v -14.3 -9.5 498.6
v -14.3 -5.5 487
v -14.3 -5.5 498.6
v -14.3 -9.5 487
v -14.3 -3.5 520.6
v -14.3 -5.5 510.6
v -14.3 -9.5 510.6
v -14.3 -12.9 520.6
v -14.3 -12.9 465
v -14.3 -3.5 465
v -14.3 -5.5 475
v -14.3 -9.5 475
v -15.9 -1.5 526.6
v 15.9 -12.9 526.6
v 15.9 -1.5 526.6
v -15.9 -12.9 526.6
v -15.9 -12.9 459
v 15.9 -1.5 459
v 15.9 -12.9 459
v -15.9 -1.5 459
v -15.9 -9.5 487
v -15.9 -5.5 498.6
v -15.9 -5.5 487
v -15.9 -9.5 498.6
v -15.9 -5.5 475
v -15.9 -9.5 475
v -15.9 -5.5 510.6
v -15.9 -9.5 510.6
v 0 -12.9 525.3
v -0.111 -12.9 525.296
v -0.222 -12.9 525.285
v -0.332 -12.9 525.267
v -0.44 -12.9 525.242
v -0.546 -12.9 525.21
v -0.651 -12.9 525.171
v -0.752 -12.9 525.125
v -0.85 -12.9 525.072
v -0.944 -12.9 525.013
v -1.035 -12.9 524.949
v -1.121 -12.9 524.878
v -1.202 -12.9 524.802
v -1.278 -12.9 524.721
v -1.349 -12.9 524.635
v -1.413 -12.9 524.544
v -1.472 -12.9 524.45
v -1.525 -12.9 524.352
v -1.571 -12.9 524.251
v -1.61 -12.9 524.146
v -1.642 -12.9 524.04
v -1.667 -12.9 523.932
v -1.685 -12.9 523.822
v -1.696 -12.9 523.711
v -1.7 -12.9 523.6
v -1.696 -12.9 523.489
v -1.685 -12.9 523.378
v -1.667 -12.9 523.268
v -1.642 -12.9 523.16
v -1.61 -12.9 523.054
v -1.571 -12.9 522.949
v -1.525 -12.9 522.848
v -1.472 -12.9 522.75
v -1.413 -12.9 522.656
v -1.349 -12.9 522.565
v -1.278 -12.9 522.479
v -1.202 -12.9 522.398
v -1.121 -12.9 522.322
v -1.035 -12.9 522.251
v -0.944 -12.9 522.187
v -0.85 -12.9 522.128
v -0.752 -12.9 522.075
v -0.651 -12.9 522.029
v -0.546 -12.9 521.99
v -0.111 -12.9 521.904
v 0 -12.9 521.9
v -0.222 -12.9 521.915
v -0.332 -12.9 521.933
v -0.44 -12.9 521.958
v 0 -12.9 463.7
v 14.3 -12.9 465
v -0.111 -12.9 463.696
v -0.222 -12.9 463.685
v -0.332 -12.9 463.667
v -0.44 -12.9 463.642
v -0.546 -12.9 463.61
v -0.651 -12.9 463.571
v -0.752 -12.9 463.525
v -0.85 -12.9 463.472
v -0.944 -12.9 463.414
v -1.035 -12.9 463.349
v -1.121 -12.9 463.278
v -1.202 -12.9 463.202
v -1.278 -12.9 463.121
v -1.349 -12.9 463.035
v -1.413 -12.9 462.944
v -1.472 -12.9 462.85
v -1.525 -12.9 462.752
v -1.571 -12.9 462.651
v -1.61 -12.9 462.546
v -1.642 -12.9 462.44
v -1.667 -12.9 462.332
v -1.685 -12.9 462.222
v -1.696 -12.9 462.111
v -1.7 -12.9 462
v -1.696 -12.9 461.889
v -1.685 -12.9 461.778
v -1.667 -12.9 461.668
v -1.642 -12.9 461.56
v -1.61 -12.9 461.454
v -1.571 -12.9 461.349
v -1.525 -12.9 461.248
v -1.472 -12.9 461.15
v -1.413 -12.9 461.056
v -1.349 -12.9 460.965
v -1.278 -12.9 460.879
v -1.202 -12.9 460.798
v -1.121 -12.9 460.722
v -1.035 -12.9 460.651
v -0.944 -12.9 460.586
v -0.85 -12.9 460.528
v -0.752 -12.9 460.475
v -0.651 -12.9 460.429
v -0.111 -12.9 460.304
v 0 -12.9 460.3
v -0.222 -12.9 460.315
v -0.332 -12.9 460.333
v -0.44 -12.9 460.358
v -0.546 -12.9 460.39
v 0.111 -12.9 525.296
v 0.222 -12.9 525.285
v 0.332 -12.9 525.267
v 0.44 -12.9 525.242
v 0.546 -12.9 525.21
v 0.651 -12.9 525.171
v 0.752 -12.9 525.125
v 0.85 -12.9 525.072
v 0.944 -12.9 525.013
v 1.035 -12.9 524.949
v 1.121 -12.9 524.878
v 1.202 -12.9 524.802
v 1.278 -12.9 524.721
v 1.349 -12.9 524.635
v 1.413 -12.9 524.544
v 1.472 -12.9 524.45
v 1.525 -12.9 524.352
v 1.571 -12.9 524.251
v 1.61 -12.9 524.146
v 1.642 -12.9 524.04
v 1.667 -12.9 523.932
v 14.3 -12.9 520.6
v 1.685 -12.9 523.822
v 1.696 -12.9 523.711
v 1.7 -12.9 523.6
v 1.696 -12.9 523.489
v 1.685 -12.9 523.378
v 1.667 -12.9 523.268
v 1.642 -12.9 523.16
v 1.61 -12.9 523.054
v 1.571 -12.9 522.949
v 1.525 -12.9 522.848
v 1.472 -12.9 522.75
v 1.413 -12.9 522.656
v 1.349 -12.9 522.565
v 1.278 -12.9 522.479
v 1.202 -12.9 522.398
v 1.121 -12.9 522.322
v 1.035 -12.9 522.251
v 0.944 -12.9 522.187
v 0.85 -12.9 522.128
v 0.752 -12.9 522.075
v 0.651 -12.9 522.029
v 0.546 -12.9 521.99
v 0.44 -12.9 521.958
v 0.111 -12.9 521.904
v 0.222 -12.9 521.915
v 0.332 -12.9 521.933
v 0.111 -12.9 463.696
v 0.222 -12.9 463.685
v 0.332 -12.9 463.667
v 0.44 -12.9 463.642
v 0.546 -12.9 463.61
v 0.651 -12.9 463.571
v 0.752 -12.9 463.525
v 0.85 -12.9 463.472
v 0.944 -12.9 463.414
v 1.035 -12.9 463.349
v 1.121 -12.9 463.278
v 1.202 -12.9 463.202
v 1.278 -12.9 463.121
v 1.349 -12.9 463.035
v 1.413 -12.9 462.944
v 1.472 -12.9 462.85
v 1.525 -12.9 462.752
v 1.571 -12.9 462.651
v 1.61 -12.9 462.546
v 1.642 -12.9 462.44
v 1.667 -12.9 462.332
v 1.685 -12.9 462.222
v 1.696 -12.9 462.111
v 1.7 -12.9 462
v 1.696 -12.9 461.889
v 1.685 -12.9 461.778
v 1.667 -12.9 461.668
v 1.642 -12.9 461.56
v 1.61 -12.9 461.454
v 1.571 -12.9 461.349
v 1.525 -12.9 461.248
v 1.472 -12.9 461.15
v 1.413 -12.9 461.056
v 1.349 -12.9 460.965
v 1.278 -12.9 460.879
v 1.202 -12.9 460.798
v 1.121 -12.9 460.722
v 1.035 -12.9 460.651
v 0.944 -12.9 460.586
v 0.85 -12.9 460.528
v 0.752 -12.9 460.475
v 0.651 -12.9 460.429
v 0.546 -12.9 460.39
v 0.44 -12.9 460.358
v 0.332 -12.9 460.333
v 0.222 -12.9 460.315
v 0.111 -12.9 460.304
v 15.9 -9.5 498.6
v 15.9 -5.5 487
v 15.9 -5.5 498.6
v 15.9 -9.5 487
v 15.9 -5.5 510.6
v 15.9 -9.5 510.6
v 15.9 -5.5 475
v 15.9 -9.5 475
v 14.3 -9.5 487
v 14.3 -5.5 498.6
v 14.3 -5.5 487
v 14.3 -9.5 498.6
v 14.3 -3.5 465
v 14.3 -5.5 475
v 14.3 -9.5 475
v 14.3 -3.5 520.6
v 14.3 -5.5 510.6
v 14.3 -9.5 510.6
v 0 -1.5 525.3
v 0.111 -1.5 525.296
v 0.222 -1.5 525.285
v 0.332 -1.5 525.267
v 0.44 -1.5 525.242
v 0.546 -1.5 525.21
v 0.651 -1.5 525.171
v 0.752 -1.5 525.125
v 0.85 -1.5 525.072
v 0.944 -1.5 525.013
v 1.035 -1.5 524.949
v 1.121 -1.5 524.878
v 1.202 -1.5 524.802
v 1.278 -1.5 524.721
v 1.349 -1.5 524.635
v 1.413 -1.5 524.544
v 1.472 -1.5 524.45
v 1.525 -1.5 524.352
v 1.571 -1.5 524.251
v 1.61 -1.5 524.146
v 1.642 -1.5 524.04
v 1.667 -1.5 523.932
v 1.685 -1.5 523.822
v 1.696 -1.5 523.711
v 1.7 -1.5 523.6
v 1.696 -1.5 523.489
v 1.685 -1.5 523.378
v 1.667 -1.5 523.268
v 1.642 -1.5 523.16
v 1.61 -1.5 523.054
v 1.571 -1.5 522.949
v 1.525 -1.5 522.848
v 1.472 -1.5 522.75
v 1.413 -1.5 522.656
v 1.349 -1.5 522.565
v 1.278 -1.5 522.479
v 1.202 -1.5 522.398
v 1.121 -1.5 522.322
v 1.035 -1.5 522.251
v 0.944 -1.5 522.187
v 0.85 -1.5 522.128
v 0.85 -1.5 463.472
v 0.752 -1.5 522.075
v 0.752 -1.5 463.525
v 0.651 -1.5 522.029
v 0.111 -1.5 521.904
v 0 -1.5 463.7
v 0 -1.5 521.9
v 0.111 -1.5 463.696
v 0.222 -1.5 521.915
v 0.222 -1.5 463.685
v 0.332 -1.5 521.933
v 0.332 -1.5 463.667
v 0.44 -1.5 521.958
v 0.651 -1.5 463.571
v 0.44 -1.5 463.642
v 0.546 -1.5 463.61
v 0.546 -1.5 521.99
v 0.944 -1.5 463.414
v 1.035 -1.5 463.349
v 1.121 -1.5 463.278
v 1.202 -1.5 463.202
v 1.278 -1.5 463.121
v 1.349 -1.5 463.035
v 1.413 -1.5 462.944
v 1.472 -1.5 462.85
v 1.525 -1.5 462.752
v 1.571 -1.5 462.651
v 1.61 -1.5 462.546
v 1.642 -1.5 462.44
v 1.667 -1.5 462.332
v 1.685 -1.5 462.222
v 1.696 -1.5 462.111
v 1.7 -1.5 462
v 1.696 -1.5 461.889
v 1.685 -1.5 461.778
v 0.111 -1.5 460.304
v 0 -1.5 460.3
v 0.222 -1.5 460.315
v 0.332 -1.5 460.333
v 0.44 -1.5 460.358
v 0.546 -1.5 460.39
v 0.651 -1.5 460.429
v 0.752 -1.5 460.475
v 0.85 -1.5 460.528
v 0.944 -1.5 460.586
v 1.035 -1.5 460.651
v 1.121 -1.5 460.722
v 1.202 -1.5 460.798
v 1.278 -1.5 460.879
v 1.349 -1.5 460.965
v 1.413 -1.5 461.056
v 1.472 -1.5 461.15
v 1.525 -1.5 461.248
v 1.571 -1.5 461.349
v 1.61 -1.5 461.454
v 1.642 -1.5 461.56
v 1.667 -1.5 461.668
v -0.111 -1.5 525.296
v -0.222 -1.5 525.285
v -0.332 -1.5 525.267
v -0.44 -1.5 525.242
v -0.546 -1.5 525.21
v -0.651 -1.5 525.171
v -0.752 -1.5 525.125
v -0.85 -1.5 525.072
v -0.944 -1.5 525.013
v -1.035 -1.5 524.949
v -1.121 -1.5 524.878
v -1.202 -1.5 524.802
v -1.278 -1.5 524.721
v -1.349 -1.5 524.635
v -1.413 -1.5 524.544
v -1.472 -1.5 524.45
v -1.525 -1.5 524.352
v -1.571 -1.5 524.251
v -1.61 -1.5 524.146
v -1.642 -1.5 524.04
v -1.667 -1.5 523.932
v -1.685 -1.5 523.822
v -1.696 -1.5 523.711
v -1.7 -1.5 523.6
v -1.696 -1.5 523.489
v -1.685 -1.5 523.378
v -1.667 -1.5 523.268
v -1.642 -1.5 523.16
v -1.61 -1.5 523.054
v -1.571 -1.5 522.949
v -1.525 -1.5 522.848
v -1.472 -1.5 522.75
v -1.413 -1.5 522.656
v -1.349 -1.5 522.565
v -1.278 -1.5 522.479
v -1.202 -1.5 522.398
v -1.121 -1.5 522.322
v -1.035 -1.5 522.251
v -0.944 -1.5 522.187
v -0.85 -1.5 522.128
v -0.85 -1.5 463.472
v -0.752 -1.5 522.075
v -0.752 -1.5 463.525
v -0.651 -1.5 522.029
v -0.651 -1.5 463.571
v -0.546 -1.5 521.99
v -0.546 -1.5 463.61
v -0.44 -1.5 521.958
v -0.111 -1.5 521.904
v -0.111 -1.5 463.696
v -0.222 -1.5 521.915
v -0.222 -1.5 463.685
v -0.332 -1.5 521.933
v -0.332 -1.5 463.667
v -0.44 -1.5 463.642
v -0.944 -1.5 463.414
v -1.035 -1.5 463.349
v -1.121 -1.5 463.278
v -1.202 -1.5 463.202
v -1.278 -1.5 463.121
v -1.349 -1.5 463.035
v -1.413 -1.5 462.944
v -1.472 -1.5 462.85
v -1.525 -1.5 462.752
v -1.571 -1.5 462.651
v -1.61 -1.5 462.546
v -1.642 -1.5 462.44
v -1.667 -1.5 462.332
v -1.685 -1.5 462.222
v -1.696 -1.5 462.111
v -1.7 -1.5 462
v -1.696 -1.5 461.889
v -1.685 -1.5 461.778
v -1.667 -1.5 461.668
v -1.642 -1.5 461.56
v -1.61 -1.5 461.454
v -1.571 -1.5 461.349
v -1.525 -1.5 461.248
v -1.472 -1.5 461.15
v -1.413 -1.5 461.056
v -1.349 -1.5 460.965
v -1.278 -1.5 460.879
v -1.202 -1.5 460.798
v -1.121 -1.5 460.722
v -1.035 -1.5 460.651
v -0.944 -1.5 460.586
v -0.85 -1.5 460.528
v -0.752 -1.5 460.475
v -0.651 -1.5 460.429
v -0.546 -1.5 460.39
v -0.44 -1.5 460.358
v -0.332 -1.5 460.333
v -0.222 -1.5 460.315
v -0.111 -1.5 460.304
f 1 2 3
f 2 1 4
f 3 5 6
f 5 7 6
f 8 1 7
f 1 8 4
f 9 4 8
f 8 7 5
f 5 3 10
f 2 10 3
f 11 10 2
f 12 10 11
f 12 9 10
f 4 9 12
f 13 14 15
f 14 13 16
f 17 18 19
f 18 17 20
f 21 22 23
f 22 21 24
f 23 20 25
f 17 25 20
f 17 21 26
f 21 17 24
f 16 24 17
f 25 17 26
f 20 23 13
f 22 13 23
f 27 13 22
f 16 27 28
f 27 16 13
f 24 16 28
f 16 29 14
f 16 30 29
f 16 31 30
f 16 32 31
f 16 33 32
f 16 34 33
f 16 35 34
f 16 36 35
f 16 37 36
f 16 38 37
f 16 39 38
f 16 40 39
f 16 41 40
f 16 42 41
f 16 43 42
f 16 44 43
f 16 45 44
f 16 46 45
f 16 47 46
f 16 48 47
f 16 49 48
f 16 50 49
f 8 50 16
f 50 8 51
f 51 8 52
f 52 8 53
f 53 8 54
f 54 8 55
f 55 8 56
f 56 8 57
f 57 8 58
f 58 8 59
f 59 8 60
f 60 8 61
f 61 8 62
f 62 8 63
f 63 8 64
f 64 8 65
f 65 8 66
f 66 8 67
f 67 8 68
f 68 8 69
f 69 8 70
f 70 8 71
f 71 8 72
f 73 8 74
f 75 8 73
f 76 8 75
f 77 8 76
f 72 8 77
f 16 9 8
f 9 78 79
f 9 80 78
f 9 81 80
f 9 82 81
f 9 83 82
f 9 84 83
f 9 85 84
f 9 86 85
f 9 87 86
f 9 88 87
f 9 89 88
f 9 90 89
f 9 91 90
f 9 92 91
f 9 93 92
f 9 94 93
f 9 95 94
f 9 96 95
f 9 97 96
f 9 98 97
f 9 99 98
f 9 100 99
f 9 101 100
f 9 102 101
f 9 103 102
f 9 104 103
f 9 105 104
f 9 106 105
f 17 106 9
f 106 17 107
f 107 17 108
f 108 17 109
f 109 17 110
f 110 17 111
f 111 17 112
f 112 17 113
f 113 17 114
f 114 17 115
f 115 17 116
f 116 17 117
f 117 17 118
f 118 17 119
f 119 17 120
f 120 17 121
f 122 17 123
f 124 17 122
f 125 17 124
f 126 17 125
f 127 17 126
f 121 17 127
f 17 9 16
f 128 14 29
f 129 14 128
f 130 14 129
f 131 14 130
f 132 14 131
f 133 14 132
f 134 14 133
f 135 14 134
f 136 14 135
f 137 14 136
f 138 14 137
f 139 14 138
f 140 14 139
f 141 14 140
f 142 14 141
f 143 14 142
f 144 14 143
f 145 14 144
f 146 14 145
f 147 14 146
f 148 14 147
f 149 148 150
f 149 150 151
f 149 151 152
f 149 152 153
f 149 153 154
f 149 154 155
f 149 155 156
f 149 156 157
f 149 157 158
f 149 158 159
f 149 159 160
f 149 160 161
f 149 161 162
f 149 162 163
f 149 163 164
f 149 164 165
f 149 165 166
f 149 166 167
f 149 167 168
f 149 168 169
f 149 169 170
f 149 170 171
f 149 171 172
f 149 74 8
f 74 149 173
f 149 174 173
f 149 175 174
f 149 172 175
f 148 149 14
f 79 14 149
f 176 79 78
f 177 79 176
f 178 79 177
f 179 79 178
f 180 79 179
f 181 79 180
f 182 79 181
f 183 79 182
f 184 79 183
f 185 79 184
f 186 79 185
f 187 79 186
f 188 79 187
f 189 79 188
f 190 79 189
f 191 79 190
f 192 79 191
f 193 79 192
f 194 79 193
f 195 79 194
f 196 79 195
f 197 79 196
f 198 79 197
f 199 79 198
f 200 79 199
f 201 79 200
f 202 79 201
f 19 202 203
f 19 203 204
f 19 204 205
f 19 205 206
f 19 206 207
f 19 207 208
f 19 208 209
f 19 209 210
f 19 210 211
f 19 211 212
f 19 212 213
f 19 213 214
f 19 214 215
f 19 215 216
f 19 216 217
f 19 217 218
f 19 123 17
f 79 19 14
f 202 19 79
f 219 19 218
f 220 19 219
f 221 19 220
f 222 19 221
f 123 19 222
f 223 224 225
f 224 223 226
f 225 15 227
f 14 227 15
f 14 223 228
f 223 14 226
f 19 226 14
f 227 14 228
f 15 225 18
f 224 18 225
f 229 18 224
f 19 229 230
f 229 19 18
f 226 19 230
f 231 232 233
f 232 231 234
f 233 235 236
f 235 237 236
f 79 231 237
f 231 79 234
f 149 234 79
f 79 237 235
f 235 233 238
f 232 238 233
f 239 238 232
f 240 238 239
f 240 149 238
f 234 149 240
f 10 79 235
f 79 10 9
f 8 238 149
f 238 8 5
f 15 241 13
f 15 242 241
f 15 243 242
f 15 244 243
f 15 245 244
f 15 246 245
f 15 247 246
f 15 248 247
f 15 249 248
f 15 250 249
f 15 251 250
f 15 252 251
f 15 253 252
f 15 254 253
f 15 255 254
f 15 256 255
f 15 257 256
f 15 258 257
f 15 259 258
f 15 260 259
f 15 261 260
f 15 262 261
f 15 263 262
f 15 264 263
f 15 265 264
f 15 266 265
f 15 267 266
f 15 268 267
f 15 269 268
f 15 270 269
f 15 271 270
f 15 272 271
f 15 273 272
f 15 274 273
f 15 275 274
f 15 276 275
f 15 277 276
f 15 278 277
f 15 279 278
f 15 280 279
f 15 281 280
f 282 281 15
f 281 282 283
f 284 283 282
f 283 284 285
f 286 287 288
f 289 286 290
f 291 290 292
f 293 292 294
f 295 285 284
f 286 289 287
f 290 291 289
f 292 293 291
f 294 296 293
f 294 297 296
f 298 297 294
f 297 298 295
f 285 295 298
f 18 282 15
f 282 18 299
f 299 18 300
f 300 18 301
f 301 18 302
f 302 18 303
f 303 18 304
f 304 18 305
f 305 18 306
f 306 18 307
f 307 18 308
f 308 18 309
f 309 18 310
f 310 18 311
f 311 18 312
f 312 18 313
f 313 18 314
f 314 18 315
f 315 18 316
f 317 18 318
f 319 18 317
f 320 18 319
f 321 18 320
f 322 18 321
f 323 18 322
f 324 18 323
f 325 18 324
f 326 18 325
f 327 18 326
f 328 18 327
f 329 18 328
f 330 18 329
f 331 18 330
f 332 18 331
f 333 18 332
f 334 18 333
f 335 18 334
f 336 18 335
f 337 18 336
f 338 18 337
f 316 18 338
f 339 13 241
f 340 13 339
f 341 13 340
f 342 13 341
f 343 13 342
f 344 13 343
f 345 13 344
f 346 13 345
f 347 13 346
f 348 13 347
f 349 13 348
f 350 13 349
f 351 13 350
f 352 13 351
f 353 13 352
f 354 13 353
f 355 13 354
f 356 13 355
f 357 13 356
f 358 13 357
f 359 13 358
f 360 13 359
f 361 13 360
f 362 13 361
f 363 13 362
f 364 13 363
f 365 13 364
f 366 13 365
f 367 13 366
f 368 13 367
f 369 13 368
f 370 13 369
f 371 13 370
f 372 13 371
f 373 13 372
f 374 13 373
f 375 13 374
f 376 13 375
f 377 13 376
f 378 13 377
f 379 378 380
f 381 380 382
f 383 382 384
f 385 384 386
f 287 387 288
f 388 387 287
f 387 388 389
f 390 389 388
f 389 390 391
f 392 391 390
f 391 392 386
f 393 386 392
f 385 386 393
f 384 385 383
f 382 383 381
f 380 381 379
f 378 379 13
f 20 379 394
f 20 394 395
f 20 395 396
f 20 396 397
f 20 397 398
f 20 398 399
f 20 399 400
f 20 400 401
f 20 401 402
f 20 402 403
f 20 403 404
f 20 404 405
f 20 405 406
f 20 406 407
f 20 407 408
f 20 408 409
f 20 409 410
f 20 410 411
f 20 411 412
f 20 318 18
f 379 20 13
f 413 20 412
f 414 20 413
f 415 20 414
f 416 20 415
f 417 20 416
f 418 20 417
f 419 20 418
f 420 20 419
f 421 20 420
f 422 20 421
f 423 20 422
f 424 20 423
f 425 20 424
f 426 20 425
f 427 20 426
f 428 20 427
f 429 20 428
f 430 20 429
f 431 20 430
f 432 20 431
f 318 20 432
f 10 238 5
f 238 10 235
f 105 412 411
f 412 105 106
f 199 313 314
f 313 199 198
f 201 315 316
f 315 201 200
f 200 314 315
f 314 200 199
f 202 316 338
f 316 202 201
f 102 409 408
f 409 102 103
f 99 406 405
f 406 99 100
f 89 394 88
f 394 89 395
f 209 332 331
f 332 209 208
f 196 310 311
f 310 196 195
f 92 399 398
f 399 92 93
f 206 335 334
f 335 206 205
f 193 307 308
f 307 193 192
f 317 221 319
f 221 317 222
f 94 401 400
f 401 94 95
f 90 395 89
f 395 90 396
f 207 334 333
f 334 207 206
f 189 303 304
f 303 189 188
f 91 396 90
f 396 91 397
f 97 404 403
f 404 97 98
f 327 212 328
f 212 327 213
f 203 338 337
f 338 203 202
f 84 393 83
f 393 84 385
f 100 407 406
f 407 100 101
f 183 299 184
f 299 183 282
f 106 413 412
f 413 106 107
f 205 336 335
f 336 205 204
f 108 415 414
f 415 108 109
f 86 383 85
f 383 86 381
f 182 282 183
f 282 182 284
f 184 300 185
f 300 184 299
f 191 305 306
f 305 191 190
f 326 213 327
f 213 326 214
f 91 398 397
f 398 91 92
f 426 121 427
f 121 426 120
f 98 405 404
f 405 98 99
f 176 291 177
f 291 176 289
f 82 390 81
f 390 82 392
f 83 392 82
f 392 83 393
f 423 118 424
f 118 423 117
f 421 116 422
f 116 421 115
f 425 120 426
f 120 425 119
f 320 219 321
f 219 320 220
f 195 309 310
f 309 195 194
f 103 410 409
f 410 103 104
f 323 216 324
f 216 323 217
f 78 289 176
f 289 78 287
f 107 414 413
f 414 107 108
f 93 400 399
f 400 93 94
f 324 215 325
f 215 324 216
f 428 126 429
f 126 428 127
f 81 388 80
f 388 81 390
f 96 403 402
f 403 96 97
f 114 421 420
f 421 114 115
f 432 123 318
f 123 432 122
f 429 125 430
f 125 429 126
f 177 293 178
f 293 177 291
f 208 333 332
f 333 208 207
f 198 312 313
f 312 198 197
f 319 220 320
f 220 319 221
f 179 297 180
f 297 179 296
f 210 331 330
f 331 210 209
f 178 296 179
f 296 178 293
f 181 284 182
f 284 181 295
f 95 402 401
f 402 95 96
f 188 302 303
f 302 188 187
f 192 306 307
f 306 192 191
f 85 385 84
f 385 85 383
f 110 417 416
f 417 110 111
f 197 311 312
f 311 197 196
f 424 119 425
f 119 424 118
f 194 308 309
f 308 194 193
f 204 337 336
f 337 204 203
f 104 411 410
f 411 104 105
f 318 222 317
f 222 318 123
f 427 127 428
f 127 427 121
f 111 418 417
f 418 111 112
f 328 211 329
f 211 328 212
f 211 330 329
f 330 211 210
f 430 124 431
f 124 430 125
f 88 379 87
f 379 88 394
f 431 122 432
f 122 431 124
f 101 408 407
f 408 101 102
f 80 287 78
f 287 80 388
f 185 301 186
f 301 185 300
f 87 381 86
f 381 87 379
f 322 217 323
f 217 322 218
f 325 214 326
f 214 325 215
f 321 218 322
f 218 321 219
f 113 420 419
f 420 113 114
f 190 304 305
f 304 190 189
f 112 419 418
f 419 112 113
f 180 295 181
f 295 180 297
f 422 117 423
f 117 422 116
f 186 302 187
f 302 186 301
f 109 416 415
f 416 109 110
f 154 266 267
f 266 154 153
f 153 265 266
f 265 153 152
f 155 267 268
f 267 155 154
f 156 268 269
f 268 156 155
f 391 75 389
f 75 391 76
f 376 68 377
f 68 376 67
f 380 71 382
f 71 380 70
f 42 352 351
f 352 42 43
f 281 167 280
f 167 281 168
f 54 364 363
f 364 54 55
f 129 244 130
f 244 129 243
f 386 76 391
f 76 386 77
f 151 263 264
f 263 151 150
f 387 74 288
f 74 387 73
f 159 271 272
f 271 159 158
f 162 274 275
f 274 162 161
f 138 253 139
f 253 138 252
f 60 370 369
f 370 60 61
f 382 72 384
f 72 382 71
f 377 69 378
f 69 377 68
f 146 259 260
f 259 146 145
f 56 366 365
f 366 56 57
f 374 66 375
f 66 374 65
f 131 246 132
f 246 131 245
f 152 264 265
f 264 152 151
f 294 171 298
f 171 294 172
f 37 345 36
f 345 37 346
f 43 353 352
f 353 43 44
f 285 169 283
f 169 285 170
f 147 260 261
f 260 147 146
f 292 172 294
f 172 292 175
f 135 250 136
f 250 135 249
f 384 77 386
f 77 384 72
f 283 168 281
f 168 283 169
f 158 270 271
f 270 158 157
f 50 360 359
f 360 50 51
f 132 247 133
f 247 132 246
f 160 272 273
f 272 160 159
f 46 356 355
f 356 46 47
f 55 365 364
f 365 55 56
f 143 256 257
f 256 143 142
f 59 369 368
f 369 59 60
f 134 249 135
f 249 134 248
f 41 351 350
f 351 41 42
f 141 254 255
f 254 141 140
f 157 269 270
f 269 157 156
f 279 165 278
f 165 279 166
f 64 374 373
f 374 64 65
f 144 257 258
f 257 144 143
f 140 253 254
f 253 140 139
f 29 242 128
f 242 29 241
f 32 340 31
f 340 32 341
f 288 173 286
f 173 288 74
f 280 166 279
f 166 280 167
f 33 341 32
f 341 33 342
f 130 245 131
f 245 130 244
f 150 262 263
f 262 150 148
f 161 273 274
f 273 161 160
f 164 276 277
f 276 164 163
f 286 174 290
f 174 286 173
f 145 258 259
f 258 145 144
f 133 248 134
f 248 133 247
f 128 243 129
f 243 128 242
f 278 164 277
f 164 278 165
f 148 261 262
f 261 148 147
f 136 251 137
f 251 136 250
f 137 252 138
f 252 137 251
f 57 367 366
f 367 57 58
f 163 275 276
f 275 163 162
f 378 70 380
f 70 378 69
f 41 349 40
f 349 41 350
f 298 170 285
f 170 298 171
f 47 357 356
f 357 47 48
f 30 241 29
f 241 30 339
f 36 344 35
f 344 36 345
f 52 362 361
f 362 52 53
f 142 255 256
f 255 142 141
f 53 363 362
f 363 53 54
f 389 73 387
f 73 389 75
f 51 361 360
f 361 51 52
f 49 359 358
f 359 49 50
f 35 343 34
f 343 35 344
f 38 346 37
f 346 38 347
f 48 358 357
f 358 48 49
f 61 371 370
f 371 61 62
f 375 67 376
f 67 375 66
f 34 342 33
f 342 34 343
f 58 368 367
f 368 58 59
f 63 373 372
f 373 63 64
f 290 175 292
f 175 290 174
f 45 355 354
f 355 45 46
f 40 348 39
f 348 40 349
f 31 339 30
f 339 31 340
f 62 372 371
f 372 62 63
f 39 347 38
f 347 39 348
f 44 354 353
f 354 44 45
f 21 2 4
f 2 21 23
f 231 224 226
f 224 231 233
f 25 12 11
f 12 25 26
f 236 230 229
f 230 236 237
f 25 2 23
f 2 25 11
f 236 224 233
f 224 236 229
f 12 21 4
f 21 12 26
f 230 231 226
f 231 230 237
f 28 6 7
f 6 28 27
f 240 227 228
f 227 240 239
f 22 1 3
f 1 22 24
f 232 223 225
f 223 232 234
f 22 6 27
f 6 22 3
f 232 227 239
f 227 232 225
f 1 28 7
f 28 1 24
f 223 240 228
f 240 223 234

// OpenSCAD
// file: ../lib/astra66_core.scad
// =============================================================================
// ASTRA-66 CAD rev B -- core library
// Parameters (generated from analysis.py by build.py), derived stations and helpers.
// Every part file includes this; stations mirror analysis.py X[] exactly.
//
// Frame: rocket axis = +Z, STA 0 = nose tip, stations increase aft.
// Angles: measured about +Z from +X toward +Y.  90 deg = switch / hatch side,
// 270 deg = camera side, 45 deg = rail-button line, fins at 0/90/180/270 deg.
// =============================================================================
include <../astra66_params.scad>

$fn = FN;
EPS = 0.01;
CAD_REV = "B";

// ----------------------------------------------------------------- radii
R_OD    = BODY_OD / 2;                 // body tube outer
R_ID    = BODY_ID / 2;                 // body tube inner
R_SH    = (BODY_ID - FIT_SH) / 2;      // printed shoulder / ring OD radius
R_SI    = R_SH - NC_SH_WALL;           // nose shoulder inner radius
R_CO    = CPL_OD / 2;                  // coupler outer
R_CI    = CPL_ID / 2;                  // coupler inner
R_BH_IN = (CPL_ID - 0.2) / 2;          // inner bulkhead disc (fits in coupler)
R_MO    = MMT_OD / 2;
R_MI    = MMT_ID / 2;
R_RING_BORE = (MMT_OD + FIT_SH) / 2;   // centering-ring / core bore
R_TAB_FLOOR = max(R_MO, RET_CLEAR_D / 2);          // rev B: tab clears the COTS retainer
FIN_TAB_H   = R_OD - R_TAB_FLOOR - FIN_TAB_CLR;

// ----------------------------------------------------------------- stations
X_NC_BASE     = NC_L;
X_SH_END      = NC_L + NC_SH_L;
X_PL_END      = NC_L + PL_L;
X_BAND_END    = X_PL_END + AV_BAND_L;
X_END         = X_BAND_END + BO_L;
L_OVERALL     = X_END;                              // airframe length (excl. COTS retainer)
X_CPL_FWD     = X_PL_END - AV_INS;
X_CPL_AFT     = X_BAND_END + AV_INS;
X_AVB_FWD_OUT = X_CPL_FWD - AV_BH_T;                // AV-303 forward face
X_AVB_AFT_OUT = X_CPL_AFT + GASKET_T;               // AV-304 outer-disc forward face
X_AVB_AFT_END = X_AVB_AFT_OUT + AV_BH_T;            // AV-304 aft face (recovery bay starts)
X_SLED_FWD    = X_CPL_FWD + AV_BH_T + SLED_FWD_GAP;
X_SLED_AFT    = X_SLED_FWD + SLED_L;
X_MMT_AFT     = X_END + MMT_AFT_EXT;
X_MMT_FWD     = X_MMT_AFT - MMT_L;
X_FIN_LE      = X_END - FIN_CR;
X_TAB_FWD     = X_FIN_LE + FIN_TAB_FWD;
X_TAB_AFT     = X_END - LOCK_T;
X_CORE_FWD    = X_TAB_FWD - CORE_RING_T;
X_CORE_AFT    = X_END - LOCK_T;
X_NC_SCREW    = NC_L + NC_SH_L / 2;
X_CAM         = X_SH_END + CAM_OFF;
X_HATCH       = X_SH_END + HATCH_OFF;
X_RB_FWD      = X_MMT_FWD - RB_FWD_OFF;
X_RB_AFT      = X_END - RB_AFT_OFF;
X_TRAY_FWD    = X_AVB_FWD_OUT - TRAY_L;
X_SW          = X_PL_END + AV_BAND_L / 2;
X_MOTOR_FWD   = X_MMT_AFT - MOTOR_L;
X_BAT0        = X_SLED_FWD + 2;
BAT_CAGE_L    = 12 + BAT_L + 0.6;
PAYLOAD_BAY_L  = X_AVB_FWD_OUT - X_SH_END;
RECOVERY_BAY_L = X_MMT_FWD - X_AVB_AFT_END;

FIN_ANGLES      = [for (i = [0 : FIN_N - 1]) i * 360 / FIN_N];
LOCK_SCREW_ANG  = [45, 135, 225, 315];
STATIC_PORT_ANG = [45, 135, 225, 315];

// ----------------------------------------------------------------- geometry helpers
function ogive_rho()  = (R_OD * R_OD + NC_L * NC_L) / (2 * R_OD);
function ogive_r(x)   = sqrt(max(pow(ogive_rho(), 2) - pow(NC_L - x, 2), 0)) + R_OD - ogive_rho();

// Solid of revolution of the tangent ogive between stations x0..x1, radially offset inward by off.
module ogive_solid(x0, x1, off = 0, n = 72) {
    s = (x0 == 0) ? 1 : 0;
    rotate_extrude()
        polygon(concat([[0, x0]],
                       [for (i = [s : n]) let(x = x0 + (x1 - x0) * i / n) [max(ogive_r(x) - off, 0.01), x]],
                       [[0, x1]]));
}

module tube_r(ro, ri, z0, z1) {
    translate([0, 0, z0]) difference() {
        cylinder(r = ro, h = z1 - z0);
        translate([0, 0, -1]) cylinder(r = ri, h = z1 - z0 + 2);
    }
}

module at_angle(a) { rotate([0, 0, a]) children(); }

// Cylinder of diameter d along the radial direction at angle a, from radius r0 to r1, at station z.
module radial_cyl(d, z, a, r0, r1) {
    at_angle(a) translate([r0, 0, z]) rotate([0, 90, 0]) cylinder(d = d, h = r1 - r0);
}

module rounded_rect(l, w, r) { offset(r = r) square([l - 2 * r, w - 2 * r], center = true); }

// Radial prism with a rounded-rectangle footprint (l axial x w tangential) centred at station z.
module radial_prism(a, z, l, w, rr, r0, r1) {
    at_angle(a) translate([r0, 0, z]) rotate([0, 90, 0]) linear_extrude(r1 - r0) rounded_rect(l, w, rr);
}

// Block in the radial frame at angle a: radial r0..r1, tangential +/-hw, stations z0..z1, clipped to radius rc.
module radial_block(a, r0, r1, hw, z0, z1, rc) {
    intersection() {
        at_angle(a) translate([r0, -hw, z0]) cube([r1 - r0, 2 * hw, z1 - z0]);
        translate([0, 0, z0 - 1]) cylinder(r = rc, h = z1 - z0 + 2);
    }
}

// Camera frame: child +Z = lens axis (outward, tilted CAM_TILT aft), origin at the lens face centre.
// Lens-face radius CAM_R0 is the smaller of (a) the tilted barrel rim 0.5 mm inside the bore and
// (b) the tilted camera-body corners 0.5 mm inside the bore -- so any CAM_W/CAM_LEN entered fits.
CAM_SETBACK = CAM_LENS_L * cos(CAM_TILT) + (CAM_LENS_HOLE - 1) / 2 * sin(CAM_TILT) + 0.5;
CAM_R0 = min(R_ID - CAM_SETBACK, sqrt(pow(R_ID - 0.5, 2) - pow(CAM_W / 2, 2)) - CAM_LEN / 2 * sin(CAM_TILT));
module cam_frame() {
    at_angle(CAM_ANG) translate([CAM_R0, 0, X_CAM]) rotate([0, 90 - CAM_TILT, 0]) children();
}

echo(str("ASTRA-66 CAD rev ", CAD_REV, ": L_OVERALL=", L_OVERALL, " payload bay=", PAYLOAD_BAY_L,
         " recovery bay=", RECOVERY_BAY_L, " fin tab depth=", FIN_TAB_H));
// main file
// ASTRA-66 CAD rev B -- AV-308 Battery cage
// Open-bottom cage for a BAT_L x BAT_W x BAT_H cell (USER placeholders) under the sled (-Y face).
// End blocks carry 2x M3 x 16 screws up into the AV-306 inserts; the cell is retained by a strap through
// the side-wall slots. PETG, FDM, printed top-plate down.
include <../lib/astra66_core.scad>

CW = BAT_W + 0.6;        // pocket width
CH = BAT_H + 0.4;        // pocket depth
WT = 1.6;                // side wall
TT = 2.0;                // top plate
Y0 = -SLED_T / 2;        // sled bottom face

module AV_308_battery_cage() {
    difference() {
        union() {
            translate([-CW / 2 - WT, Y0 - TT, X_BAT0]) cube([CW + 2 * WT, TT, BAT_CAGE_L]);
            for (s = [-1, 1]) translate([s > 0 ? CW / 2 : -CW / 2 - WT, Y0 - TT - CH, X_BAT0]) cube([WT, CH + EPS, BAT_CAGE_L]);
            for (z = [X_BAT0, X_BAT0 + BAT_CAGE_L - 6]) translate([-CW / 2 - WT, Y0 - TT - CH, z]) cube([CW + 2 * WT, CH + EPS, 6]);
        }
        for (z = [X_BAT0 + 3, X_BAT0 + BAT_CAGE_L - 3]) translate([0, Y0 - TT - CH - 1, z]) rotate([-90, 0, 0]) cylinder(d = CLR_M3, h = CH + TT + 2);
        for (z = [X_BAT0 + 16, X_BAT0 + BAT_CAGE_L - 28]) translate([-CW, Y0 - TT - 6, z]) cube([2 * CW, 4, 12]);
    }
}

AV_308_battery_cage();
